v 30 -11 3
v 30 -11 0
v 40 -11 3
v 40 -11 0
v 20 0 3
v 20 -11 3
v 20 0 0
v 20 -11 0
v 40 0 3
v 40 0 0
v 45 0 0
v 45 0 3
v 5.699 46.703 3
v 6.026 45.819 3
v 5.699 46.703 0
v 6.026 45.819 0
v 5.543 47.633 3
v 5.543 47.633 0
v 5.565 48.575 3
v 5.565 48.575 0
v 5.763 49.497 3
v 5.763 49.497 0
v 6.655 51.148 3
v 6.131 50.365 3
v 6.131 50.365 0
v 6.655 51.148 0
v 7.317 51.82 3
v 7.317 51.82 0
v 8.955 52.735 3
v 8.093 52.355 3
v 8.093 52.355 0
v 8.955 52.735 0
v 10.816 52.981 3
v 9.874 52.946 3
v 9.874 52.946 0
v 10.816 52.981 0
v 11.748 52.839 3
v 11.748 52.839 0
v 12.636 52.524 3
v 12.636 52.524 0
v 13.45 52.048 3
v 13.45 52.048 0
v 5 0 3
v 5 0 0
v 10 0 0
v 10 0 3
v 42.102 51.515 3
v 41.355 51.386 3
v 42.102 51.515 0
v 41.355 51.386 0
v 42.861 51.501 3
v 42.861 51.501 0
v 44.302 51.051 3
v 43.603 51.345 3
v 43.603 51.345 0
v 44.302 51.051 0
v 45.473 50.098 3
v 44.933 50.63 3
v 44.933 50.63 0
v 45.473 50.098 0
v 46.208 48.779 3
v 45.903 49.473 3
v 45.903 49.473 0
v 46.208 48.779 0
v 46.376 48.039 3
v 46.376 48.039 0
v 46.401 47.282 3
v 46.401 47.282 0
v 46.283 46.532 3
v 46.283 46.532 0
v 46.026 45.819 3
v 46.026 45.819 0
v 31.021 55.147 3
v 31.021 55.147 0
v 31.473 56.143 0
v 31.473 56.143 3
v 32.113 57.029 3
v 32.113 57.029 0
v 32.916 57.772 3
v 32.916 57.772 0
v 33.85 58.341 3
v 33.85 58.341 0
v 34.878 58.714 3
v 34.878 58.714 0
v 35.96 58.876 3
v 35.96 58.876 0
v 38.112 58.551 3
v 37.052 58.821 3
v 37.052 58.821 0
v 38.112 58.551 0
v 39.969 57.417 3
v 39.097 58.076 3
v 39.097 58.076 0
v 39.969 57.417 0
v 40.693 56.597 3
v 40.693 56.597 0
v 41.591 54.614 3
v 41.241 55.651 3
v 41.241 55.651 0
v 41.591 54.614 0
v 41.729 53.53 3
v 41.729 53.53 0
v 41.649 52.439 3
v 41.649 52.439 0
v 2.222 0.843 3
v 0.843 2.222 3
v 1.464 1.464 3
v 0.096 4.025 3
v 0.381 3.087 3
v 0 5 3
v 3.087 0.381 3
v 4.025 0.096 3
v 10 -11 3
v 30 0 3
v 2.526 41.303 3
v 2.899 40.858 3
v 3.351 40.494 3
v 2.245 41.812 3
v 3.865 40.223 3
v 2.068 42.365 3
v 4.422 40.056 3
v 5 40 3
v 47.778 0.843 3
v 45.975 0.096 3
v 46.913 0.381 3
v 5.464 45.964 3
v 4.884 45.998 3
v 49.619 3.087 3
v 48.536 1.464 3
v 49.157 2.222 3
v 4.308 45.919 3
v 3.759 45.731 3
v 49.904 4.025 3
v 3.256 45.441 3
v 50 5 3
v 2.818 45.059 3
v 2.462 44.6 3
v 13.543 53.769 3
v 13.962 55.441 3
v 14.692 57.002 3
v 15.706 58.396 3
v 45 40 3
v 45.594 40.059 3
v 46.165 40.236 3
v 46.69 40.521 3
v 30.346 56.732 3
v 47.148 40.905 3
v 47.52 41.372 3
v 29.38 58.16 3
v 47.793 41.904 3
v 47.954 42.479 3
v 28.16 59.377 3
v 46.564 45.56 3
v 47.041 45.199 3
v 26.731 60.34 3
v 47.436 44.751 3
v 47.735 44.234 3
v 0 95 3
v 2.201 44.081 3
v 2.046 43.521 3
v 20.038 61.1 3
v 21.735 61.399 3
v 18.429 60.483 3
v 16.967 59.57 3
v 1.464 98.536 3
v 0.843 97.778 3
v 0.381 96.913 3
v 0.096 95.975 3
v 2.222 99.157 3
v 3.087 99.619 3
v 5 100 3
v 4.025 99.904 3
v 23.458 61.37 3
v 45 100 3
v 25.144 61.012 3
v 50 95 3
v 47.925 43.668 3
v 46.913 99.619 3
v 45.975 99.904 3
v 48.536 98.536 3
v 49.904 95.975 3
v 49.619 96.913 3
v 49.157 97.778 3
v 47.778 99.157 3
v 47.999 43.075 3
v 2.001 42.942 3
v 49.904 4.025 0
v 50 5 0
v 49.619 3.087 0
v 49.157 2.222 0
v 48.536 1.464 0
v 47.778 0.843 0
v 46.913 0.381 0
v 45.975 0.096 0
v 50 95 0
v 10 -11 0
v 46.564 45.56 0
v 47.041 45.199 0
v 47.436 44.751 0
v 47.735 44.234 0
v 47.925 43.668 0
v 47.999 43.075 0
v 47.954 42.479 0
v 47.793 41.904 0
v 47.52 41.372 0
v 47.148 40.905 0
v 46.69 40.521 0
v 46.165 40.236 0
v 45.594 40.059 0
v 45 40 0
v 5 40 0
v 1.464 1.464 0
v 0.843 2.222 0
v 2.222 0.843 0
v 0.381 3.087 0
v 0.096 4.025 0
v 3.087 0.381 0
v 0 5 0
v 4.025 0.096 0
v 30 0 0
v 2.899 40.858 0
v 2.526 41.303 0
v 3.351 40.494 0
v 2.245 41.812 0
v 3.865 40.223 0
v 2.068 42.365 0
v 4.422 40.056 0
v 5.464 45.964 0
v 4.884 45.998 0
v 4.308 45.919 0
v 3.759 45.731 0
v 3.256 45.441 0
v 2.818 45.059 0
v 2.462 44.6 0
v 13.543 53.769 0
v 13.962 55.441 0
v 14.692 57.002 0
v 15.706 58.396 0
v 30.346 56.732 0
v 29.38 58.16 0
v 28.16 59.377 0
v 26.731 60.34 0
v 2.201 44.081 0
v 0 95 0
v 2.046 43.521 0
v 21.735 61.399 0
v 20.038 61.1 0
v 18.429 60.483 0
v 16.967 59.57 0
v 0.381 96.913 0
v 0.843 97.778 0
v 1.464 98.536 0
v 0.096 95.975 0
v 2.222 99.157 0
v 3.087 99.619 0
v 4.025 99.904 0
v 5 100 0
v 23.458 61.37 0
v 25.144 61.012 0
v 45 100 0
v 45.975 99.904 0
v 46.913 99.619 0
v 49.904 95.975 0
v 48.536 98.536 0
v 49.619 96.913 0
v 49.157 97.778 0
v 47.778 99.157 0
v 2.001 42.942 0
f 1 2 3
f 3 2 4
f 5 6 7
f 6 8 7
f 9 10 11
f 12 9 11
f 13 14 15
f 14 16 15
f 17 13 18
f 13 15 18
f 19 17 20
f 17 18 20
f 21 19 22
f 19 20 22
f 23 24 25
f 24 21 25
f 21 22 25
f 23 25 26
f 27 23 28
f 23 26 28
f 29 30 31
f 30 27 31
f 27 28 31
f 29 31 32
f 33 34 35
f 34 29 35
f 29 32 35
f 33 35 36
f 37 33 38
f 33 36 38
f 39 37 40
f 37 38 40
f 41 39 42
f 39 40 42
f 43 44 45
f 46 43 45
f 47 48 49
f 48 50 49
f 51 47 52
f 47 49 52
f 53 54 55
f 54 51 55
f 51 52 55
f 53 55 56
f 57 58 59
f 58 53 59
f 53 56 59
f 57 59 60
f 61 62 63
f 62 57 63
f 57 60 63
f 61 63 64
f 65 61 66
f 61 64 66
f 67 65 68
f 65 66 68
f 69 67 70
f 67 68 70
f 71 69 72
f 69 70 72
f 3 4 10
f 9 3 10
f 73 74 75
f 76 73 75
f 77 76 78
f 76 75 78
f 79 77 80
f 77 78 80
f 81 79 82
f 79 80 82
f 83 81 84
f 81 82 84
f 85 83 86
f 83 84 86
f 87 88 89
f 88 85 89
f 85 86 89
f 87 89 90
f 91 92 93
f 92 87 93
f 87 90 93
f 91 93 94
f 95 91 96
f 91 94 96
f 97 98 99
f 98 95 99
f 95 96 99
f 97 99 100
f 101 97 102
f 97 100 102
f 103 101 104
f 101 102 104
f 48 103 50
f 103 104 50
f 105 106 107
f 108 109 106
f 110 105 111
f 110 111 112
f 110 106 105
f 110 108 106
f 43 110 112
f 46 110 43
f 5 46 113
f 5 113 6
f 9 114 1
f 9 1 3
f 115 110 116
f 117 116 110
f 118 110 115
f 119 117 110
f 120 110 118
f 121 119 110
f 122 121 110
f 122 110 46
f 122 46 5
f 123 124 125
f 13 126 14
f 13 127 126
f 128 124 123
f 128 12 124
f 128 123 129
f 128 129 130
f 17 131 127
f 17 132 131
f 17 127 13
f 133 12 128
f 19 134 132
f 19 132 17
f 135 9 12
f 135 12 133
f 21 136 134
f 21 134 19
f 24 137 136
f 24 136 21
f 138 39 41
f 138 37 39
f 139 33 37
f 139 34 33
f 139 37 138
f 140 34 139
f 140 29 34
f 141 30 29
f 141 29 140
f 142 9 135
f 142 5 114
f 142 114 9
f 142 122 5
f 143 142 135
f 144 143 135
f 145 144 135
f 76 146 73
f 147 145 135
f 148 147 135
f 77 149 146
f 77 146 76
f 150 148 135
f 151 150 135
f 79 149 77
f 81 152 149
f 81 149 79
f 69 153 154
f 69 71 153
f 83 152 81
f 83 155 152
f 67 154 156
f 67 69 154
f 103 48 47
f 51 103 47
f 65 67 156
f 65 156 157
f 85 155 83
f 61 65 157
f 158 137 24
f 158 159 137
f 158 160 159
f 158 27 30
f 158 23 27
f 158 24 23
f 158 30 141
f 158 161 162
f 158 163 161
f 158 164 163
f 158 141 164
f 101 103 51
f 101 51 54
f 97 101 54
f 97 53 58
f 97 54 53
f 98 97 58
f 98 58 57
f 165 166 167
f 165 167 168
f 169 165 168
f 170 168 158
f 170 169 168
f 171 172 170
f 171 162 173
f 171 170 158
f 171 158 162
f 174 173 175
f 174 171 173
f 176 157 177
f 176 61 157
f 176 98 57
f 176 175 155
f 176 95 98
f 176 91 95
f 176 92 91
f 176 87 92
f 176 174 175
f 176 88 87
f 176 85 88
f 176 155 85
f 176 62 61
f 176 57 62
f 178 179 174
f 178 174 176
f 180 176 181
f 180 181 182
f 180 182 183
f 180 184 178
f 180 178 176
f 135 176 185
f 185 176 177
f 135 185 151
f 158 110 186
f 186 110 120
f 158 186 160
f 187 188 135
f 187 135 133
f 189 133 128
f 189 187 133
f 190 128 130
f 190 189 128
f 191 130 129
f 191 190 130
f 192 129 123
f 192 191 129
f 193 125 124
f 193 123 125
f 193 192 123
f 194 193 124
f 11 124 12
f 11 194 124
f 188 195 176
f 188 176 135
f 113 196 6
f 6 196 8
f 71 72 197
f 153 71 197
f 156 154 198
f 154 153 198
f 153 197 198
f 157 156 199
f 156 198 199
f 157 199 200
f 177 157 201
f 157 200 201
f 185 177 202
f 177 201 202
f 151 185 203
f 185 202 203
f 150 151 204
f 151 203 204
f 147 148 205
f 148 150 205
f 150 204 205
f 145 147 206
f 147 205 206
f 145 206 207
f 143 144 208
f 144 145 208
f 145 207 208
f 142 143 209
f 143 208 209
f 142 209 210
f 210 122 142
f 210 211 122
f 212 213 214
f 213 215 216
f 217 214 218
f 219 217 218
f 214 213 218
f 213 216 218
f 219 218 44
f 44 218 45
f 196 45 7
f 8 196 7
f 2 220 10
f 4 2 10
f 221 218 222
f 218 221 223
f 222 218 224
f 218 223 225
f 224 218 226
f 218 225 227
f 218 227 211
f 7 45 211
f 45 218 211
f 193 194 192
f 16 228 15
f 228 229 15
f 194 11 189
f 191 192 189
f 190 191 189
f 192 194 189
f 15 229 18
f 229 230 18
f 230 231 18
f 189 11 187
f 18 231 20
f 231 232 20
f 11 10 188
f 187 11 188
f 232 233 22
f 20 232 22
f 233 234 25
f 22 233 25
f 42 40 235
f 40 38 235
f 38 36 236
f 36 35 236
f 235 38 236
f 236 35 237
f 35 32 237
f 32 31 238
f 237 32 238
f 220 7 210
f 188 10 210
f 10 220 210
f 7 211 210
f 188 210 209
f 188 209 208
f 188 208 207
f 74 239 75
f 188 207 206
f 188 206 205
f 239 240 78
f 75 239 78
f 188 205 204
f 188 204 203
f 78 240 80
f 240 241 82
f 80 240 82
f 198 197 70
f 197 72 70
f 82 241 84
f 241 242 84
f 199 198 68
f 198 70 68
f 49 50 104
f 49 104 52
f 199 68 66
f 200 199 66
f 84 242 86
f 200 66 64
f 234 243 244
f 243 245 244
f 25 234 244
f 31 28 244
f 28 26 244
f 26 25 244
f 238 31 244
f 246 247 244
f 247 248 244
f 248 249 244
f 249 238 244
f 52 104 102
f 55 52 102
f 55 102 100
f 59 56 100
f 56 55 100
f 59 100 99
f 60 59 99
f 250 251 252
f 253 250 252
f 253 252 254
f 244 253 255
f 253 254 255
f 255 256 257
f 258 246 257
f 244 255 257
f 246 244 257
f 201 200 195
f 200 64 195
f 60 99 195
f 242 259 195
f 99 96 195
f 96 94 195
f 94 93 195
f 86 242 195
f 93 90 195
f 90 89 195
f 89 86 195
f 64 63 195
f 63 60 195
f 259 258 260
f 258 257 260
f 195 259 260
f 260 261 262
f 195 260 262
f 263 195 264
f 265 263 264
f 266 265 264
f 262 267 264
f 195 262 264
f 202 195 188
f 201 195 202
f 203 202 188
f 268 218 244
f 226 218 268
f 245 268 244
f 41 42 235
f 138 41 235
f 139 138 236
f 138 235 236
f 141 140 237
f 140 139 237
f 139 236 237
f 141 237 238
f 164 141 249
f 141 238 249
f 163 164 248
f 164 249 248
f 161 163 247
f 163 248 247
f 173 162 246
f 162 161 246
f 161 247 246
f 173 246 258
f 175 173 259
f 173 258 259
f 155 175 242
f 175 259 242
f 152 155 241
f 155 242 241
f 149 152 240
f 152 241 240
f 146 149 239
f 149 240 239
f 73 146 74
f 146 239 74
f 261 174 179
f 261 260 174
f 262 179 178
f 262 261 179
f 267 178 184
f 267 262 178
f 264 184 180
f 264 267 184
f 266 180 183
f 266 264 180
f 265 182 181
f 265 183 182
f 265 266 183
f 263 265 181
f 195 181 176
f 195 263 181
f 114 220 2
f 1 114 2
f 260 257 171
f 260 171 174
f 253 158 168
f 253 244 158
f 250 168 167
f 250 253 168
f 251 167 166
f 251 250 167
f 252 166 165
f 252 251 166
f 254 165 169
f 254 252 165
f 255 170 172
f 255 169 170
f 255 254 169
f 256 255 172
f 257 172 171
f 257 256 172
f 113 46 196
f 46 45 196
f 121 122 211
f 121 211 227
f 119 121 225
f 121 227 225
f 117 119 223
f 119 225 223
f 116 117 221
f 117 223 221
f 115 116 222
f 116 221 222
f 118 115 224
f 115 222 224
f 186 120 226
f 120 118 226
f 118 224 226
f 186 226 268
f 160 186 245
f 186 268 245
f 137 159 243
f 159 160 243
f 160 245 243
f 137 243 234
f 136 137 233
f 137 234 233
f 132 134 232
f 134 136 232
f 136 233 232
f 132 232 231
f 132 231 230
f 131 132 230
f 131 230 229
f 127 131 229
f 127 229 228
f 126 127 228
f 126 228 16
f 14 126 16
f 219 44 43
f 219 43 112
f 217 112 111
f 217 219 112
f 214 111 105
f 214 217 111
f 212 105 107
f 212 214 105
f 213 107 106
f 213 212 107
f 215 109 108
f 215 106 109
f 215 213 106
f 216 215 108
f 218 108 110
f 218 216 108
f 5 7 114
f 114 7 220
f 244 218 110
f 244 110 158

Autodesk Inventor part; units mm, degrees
ref_plane "YZ Plane" through (0, 0, 0) normal (1, 0, 0) x (0, 1, 0)
ref_plane "XZ Plane" through (0, 0, 0) normal (0, 1, 0) x (-1, 0, 0)
ref_plane "XY Plane" through (0, 0, 0) normal (0, 0, 1) x (1, 0, 0)
sketch "Skizze1" plane through (0, 0, 0) normal (0, 0, 1) x (1, 0, 0)
  line L0 (0, 5) -> (0, 95)
  line L1 (5, 100) -> (45, 100)
  line L2 (50, 95) -> (50, 5)
  arc A0 (5, 100) -> (0, 95) centre (5, 95) ccw
  arc A1 (50, 95) -> (45, 100) centre (45, 95) ccw
  arc A2 (45, 0) -> (50, 5) centre (45, 5) ccw
  arc A3 (0, 5) -> (5, 0) centre (5, 5) ccw
  line L3 (10, 0) -> (10, -11)
  line L4 (10, -11) -> (20, -11)
  line L5 (20, -11) -> (20, 0)
  line L6 (30, 0) -> (30, -11)
  line L7 (30, -11) -> (40, -11)
  line L8 (40, -11) -> (40, 0)
  line L9 (5, 0) -> (10, 0)
  line L10 (20, 0) -> (30, 0)
  line L11 (40, 0) -> (45, 0)
  line L12 (5, 40) -> (45, 40)
  arc A4 (6.0261, 45.8191) -> (5, 40) centre (5, 43) ccw
  arc A5 (45, 40) -> (46.0261, 45.8191) centre (45, 43) ccw
  arc A6 (46.0261, 45.8191) -> (41.3553, 51.3855) centre (42.4089, 47.5268) ccw
  arc A7 (13.45, 52.0485) -> (6.0261, 45.8191) centre (10.5305, 47.9894) ccw
  arc A8 (31.0213, 55.1468) -> (13.45, 52.0485) centre (22.442, 52.4271) ccw
  line L13 (5, 40) -> (6.0261, 45.8191) construction
  line L14 (6.0261, 45.8191) -> (13.45, 52.0485) construction
  line L15 (13.45, 52.0485) -> (31.0213, 55.1468) construction
  line L16 (41.3553, 51.3855) -> (46.0261, 45.8191) construction
  line L17 (45, 40) -> (46.0261, 45.8191) construction
  arc A9 (41.3553, 51.3855) -> (31.0213, 55.1468) centre (36.2306, 53.3825) ccw
  line L18 (31.0213, 55.1468) -> (41.3553, 51.3855) construction
  point P0 (0, 0)
  point P1 (25, 40)
  point P2 (25, 0)
  dimension "d1" = 50
  dimension "d3" = 5
  dimension "d4" = 11
  dimension "d5" = 10
  dimension "d6" = 100
  dimension "d15" = 40
  dimension "d24" = 40
  dimension "d28" = 3
  dimension "d29" = 3
  dimension "d30" = 100
  dimension "d31" = 4
  dimension "d32" = 130
  dimension "d33" = 80
  dimension "d34" = 140
  dimension "d35" = 5
  dimension "d36" = 9
  dimension "d37" = 5.5
  dimension "d38" = 150
  dimension "d39" = 150
  dimension "d40" = 12.0485
  dimension "d41" = 11.3855
extrude "Extrusion1" add sketch "Skizze1" along normal blind 3
properties part number "Scheibe" material "Glas"
